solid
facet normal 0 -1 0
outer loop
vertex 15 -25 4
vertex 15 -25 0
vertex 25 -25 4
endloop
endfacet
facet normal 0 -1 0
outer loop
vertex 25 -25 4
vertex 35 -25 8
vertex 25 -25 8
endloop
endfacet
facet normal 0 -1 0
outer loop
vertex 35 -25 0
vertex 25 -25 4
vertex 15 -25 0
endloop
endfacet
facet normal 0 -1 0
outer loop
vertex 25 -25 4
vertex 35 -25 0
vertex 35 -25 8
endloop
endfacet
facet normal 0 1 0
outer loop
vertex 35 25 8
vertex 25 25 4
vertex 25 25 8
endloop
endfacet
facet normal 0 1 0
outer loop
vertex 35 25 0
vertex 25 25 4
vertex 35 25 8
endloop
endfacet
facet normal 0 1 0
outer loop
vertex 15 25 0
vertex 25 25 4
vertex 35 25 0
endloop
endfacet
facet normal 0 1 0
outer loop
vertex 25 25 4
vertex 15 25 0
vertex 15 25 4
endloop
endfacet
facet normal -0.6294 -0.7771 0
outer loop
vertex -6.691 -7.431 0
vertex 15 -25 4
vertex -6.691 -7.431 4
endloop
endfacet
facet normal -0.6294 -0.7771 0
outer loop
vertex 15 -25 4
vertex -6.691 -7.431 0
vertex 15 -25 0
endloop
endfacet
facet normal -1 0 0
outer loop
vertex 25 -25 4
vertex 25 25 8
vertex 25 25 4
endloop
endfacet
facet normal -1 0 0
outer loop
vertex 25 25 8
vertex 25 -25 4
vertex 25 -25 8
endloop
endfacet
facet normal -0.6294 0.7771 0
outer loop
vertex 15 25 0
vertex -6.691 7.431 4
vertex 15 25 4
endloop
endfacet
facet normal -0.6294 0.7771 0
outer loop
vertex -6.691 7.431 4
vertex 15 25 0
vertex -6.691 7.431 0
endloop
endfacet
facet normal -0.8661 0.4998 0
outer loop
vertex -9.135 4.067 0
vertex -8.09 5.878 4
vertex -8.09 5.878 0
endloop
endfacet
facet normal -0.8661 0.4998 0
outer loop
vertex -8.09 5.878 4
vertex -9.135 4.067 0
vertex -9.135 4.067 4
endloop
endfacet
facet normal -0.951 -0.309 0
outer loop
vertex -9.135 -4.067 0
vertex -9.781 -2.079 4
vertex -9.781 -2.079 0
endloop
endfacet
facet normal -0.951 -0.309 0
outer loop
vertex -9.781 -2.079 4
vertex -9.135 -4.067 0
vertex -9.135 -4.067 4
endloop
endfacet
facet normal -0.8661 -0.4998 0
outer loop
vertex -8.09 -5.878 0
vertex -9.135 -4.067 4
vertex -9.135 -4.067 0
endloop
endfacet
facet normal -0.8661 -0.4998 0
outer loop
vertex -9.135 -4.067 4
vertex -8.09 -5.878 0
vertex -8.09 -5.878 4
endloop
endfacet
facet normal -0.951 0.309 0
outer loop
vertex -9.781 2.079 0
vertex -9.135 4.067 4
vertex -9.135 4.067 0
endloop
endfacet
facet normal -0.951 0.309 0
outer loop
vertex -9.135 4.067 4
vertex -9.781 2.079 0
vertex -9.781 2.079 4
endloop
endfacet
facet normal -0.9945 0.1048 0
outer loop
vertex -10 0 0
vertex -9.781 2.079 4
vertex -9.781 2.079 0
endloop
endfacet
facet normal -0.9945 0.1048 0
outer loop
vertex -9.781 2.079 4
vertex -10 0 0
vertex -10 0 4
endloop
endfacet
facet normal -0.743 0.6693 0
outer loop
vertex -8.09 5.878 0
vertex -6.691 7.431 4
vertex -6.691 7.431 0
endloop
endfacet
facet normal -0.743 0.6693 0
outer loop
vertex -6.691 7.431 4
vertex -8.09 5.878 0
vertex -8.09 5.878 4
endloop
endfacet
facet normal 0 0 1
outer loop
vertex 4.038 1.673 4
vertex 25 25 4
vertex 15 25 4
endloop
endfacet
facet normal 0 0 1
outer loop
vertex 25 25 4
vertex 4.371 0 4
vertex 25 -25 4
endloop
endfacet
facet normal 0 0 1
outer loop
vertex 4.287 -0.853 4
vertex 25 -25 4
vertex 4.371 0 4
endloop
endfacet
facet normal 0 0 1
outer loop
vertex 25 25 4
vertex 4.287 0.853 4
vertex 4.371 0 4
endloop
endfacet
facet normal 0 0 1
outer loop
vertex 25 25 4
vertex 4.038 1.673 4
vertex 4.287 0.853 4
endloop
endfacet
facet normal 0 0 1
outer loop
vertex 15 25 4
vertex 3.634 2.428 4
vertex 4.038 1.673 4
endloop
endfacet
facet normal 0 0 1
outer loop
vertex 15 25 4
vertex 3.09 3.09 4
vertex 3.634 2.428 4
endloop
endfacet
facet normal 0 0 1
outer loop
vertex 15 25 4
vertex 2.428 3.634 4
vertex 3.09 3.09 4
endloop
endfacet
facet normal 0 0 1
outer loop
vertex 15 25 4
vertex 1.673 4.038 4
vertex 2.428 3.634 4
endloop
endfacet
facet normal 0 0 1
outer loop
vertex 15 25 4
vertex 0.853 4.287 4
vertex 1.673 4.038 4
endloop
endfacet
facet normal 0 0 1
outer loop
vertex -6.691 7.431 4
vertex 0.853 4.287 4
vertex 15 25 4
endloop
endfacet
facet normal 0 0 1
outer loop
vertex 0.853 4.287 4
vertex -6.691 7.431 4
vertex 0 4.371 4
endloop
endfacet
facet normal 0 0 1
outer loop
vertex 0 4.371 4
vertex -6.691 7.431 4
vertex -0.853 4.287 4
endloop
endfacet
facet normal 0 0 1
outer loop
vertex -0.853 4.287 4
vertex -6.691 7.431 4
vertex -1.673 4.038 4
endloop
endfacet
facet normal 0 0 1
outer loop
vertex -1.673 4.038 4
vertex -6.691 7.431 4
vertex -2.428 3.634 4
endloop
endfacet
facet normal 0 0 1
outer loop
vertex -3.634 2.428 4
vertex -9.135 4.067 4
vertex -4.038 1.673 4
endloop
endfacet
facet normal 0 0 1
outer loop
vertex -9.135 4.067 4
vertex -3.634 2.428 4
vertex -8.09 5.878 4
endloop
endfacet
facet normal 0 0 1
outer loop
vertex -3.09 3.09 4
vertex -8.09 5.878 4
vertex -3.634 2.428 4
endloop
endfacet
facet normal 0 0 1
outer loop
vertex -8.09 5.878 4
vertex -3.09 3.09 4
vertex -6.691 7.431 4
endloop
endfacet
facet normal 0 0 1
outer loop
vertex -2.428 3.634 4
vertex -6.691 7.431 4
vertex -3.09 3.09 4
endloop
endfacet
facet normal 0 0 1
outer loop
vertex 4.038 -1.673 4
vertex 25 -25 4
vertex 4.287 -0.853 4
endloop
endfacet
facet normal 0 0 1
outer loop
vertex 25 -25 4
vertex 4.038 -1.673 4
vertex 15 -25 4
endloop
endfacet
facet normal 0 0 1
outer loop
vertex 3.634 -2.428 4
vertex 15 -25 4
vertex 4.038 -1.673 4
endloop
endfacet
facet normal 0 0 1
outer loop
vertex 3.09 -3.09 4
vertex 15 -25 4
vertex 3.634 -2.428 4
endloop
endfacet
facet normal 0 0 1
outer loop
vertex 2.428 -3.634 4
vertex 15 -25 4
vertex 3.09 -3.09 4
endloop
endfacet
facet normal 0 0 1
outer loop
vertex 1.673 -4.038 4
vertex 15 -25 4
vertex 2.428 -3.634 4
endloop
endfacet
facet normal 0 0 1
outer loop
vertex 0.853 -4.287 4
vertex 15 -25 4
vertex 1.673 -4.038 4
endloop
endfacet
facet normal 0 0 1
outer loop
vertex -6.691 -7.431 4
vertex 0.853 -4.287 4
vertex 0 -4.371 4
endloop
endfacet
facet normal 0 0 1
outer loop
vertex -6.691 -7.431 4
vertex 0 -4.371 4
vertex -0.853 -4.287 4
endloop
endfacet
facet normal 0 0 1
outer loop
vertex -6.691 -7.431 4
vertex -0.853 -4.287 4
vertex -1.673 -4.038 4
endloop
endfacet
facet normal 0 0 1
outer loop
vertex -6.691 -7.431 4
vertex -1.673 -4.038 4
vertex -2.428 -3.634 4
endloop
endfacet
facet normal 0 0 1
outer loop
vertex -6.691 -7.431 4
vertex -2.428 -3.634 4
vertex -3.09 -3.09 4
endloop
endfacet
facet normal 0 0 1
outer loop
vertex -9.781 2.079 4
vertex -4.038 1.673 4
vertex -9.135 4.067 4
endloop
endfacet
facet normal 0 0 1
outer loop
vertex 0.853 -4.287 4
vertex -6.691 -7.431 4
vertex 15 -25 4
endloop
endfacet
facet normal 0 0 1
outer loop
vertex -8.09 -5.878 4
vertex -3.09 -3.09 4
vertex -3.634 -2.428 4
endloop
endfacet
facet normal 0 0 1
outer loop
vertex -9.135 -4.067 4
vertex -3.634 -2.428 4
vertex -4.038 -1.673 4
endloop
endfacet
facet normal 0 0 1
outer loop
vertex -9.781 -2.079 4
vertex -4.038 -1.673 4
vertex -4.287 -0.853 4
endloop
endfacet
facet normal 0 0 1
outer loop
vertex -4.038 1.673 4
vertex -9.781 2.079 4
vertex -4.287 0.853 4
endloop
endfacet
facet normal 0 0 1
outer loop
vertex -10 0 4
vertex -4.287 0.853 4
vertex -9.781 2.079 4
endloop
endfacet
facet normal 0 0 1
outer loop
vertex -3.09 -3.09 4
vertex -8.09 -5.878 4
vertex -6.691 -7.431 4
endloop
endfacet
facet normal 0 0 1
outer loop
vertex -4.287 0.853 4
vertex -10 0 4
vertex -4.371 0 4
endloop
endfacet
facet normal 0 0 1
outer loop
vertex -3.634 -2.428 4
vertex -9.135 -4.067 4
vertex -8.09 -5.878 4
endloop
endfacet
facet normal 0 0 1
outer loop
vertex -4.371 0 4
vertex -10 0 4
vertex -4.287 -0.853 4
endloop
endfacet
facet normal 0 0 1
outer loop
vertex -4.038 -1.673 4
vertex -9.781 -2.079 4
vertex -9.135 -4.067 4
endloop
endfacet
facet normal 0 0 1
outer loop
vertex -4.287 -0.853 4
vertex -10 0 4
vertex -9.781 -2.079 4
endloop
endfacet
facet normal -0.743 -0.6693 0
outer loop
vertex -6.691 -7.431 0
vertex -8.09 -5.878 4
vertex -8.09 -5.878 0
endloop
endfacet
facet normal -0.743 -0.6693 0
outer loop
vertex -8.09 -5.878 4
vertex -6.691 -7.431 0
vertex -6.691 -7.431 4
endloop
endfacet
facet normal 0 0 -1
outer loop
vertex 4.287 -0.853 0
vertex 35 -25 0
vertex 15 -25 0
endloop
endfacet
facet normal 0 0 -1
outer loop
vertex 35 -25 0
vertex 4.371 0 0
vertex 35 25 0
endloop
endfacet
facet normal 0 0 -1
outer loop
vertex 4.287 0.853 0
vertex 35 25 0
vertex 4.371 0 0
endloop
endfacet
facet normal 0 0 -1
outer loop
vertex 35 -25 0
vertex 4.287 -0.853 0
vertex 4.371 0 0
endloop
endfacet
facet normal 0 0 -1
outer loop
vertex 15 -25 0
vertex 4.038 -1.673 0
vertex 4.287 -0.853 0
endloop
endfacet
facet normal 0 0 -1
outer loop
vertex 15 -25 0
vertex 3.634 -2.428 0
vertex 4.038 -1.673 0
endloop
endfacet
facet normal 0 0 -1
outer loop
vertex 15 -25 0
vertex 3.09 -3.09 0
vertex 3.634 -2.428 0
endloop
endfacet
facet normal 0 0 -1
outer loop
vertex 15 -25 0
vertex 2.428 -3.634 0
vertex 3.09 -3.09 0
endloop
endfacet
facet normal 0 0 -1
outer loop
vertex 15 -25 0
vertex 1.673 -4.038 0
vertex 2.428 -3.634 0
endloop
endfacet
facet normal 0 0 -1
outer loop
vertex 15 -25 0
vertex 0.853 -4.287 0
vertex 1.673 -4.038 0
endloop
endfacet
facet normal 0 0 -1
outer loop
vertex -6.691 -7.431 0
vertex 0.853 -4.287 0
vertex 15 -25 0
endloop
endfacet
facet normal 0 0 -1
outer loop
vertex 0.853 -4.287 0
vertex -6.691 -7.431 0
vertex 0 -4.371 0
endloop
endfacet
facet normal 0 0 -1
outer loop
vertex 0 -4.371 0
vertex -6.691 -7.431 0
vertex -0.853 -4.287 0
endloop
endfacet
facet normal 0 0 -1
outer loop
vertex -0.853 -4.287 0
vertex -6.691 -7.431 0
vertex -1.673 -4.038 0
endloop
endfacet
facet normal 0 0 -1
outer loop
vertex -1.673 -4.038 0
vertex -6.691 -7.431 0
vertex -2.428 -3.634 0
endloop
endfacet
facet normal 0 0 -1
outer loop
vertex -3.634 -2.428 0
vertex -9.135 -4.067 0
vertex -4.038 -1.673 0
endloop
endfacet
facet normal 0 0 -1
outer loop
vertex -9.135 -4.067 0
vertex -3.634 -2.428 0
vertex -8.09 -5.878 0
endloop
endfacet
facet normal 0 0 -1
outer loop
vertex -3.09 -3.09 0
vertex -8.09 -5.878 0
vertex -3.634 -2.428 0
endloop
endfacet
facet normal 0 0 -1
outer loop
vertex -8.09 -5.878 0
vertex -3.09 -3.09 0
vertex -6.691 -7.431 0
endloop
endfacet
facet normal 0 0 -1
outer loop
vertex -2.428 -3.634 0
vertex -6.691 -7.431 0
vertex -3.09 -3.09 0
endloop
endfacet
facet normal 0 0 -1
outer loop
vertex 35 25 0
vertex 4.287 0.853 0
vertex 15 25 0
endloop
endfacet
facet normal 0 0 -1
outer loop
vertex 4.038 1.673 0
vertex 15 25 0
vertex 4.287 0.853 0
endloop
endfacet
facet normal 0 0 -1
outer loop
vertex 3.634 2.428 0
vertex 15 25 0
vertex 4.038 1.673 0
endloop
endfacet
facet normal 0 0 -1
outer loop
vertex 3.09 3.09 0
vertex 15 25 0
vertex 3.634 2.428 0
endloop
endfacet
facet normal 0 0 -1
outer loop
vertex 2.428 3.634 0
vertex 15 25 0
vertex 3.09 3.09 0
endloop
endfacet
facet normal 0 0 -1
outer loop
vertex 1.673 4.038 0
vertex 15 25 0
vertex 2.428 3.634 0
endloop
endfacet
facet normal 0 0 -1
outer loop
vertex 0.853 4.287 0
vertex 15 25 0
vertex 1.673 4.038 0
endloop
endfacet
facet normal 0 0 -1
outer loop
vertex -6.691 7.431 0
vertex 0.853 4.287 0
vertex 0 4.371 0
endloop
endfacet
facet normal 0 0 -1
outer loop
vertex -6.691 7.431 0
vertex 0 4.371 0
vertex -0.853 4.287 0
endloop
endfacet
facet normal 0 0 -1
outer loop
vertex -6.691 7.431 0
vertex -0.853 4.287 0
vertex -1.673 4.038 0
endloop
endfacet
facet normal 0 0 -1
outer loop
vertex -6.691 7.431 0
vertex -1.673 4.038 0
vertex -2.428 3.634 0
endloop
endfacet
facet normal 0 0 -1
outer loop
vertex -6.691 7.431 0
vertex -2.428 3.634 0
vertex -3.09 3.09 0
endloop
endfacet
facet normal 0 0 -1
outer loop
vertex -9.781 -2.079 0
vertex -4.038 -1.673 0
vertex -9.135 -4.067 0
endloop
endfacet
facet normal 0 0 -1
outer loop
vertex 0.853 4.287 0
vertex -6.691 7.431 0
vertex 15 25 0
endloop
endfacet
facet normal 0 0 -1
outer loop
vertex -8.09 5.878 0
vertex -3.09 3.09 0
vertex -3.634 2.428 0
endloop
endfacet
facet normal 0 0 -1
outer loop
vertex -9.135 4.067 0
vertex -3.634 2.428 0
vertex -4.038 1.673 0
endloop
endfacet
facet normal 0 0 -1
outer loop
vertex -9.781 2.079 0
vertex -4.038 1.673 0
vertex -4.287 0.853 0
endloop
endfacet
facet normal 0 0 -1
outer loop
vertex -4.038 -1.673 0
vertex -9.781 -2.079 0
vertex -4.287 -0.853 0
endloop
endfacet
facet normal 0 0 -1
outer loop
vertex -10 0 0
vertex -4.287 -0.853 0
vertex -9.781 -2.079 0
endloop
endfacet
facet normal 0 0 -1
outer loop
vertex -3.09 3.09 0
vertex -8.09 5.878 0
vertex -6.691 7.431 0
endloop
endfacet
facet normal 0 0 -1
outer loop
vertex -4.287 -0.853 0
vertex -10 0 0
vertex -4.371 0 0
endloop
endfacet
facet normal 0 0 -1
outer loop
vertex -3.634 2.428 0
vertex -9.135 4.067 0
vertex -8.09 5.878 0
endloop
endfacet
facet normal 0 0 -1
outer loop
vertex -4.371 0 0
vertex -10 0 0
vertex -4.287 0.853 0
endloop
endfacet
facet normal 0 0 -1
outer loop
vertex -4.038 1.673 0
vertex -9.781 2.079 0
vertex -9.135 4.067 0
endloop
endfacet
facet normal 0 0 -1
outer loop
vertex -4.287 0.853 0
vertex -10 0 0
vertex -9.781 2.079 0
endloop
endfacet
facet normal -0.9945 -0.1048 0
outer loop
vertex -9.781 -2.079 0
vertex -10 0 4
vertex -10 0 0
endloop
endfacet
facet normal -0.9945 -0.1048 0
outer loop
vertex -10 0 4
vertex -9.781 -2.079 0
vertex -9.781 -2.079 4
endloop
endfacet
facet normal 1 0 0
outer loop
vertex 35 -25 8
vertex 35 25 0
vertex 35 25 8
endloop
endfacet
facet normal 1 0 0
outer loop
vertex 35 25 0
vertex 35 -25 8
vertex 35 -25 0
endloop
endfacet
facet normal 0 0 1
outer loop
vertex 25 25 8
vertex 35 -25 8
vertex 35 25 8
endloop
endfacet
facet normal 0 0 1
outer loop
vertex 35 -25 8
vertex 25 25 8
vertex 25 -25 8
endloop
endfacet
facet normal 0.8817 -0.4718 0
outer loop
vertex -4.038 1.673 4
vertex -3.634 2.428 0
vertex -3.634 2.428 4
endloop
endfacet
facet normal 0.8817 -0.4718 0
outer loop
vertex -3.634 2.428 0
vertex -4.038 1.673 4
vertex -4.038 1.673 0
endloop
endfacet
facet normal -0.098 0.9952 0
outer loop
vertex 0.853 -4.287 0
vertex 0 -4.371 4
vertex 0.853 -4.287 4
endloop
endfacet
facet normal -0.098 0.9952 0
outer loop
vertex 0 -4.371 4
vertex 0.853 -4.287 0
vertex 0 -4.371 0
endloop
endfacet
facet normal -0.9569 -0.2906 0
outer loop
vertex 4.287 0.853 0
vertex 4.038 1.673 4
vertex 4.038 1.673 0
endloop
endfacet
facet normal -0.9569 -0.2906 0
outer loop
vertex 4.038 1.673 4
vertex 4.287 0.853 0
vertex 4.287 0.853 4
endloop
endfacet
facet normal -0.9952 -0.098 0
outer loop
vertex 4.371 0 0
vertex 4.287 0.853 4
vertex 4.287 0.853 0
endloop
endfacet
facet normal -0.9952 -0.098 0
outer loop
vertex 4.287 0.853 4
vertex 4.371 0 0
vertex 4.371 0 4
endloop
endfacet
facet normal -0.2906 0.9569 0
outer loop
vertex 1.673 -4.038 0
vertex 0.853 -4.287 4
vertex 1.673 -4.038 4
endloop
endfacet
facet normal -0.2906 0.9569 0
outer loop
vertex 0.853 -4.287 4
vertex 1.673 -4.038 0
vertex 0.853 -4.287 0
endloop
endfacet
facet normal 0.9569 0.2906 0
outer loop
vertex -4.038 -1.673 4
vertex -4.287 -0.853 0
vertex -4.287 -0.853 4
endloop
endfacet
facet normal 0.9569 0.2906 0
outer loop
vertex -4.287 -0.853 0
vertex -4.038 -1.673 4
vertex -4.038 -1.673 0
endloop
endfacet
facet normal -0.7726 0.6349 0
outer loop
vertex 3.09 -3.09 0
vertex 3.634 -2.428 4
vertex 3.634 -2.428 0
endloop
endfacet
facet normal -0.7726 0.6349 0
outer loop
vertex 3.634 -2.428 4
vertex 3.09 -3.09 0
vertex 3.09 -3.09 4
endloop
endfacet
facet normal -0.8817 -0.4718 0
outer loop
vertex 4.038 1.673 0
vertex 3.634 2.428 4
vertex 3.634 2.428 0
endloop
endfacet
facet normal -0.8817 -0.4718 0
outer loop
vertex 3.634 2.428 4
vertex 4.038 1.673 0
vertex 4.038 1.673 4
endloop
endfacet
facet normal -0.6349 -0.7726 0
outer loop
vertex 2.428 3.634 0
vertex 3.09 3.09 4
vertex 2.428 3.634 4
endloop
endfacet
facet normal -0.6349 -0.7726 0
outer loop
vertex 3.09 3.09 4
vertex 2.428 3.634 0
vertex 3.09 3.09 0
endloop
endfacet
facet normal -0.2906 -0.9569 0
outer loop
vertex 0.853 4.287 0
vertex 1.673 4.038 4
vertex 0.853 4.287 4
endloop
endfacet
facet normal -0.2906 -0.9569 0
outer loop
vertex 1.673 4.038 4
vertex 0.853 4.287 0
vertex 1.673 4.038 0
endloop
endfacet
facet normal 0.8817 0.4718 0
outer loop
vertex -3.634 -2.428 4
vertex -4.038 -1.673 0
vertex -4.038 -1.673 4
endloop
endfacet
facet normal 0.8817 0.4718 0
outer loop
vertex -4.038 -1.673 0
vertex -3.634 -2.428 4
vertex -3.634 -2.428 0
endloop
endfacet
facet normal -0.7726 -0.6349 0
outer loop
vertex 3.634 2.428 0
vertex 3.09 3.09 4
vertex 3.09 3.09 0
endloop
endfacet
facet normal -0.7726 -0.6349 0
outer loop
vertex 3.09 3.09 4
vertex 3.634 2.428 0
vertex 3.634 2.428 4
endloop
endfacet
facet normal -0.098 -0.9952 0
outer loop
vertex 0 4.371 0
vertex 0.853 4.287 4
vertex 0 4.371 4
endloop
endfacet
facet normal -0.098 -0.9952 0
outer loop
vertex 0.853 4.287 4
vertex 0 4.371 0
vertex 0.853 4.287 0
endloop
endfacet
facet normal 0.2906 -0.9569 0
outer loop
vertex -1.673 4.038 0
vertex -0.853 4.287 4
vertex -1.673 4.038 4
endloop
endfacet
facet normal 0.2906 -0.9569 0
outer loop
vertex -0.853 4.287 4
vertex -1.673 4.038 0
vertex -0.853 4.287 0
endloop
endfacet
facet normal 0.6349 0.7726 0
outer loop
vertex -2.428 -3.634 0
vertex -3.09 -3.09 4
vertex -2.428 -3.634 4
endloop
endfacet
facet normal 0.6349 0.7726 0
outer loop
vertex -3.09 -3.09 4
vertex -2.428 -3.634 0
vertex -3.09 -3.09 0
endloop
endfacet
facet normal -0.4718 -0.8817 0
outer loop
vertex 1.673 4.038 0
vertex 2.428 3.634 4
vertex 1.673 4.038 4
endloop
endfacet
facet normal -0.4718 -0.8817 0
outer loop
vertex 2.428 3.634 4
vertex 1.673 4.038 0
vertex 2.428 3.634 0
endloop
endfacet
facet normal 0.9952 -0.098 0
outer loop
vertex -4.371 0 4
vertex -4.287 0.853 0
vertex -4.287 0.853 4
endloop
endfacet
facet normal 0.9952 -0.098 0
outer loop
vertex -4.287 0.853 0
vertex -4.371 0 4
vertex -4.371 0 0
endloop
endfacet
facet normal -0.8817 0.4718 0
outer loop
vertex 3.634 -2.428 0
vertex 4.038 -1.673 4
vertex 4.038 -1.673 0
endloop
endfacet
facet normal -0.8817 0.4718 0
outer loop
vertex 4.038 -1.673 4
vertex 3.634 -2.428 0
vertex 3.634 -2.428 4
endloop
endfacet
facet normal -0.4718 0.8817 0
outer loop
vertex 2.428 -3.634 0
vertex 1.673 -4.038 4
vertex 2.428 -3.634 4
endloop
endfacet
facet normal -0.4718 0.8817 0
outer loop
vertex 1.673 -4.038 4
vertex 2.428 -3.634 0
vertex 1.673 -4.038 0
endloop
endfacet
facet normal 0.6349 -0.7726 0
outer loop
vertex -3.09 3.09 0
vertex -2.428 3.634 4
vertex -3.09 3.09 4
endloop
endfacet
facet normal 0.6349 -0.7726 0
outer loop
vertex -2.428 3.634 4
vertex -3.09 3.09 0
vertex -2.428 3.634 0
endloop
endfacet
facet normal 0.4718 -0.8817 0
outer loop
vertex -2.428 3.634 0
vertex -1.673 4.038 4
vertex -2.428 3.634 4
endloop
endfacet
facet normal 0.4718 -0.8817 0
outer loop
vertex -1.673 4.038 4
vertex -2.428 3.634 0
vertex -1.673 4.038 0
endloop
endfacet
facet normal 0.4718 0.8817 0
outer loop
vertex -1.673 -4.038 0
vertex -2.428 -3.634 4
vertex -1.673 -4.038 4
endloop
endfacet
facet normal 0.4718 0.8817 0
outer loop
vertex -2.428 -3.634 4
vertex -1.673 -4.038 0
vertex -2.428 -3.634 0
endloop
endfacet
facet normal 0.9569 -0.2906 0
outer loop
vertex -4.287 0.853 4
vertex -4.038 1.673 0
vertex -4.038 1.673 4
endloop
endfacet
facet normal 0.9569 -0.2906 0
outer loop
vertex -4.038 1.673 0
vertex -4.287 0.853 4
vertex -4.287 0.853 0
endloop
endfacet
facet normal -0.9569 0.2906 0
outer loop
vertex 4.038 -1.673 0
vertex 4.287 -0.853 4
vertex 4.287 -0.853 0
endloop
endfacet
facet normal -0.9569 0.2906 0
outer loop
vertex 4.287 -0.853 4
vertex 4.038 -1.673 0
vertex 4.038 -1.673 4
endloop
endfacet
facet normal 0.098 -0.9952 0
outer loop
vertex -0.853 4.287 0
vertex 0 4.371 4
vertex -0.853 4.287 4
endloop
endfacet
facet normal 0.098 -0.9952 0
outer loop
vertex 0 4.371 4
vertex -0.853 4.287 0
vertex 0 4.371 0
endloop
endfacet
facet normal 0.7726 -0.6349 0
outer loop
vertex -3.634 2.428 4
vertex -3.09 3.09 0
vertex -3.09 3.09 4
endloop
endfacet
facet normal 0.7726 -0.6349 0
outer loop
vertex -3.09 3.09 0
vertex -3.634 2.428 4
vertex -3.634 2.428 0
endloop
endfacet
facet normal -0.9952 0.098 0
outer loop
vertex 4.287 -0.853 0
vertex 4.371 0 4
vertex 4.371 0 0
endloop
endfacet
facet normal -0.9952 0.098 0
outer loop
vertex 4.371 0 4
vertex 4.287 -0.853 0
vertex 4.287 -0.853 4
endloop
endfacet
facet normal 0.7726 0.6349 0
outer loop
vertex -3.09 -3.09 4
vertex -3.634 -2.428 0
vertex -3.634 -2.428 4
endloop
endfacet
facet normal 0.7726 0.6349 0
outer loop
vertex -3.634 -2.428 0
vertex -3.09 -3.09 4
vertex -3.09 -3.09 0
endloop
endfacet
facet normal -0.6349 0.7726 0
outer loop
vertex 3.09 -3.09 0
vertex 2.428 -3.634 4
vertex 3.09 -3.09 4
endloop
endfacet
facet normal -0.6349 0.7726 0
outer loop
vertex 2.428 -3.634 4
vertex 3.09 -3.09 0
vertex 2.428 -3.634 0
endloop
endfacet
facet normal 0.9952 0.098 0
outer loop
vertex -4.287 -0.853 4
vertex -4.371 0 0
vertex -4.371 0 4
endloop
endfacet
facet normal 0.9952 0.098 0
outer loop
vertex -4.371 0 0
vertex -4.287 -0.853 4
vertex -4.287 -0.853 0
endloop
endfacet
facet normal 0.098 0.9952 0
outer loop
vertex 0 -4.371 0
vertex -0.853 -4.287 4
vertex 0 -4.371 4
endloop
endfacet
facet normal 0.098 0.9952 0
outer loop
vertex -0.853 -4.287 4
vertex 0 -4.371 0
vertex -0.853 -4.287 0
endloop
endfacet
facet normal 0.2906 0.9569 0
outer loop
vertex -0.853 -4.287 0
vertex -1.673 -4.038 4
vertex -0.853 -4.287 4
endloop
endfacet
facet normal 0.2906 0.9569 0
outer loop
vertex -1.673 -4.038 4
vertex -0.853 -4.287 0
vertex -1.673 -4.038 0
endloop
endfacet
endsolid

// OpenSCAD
// file: bolts.scad
$radial_error = 0.1;
$fn = 4*8;

module cylinder_outer(height, radius, fn=$fn, radial_error=$radial_error) {
	fudge = 1/cos(180/fn);
	cylinder(h=height,r=radius*fudge+$radial_error, $fn=fn);
}

module cylinder_inner(height, radius, fn=$fn) {
	cylinder(h=height,r=radius-$radial_error,$fn=fn);
}

// Make a hole. The diameter is the size of the screw (e.g. 3 for M3). Depth is how far the hole should go for the thread, and inset is how far out there should be a hole for the head to go.
module hole(diameter=3, depth=6, inset=10) {
	cylinder_outer(depth, diameter/2);
	translate([0, 0, depth]) cylinder_outer(inset, diameter, 32);
}

module countersunk_hole(diameter=3, depth=6, inset=10) {
	hole(diameter, depth, inset);
	translate([0, 0, depth-diameter/2]) cylinder(r1=diameter/2+$radial_error, r2=diameter+$radial_error, h=diameter/2);
}

module threaded_countersunk_hole(diameter=3, depth=6, inset=10) {
	hole(diameter*0.9, depth, inset);
	translate([0, 0, depth-diameter/2]) cylinder(r1=diameter/2+$radial_error, r2=diameter+$radial_error, h=diameter/2);
}

module knurled_insert(diameter = 3, depth = 6, thickness = 1) {
	cylinder_inner(depth, diameter/2 + thickness);
}

module knurled_hole(diameter = 3, depth = 6, inset = 10, insert = 4, thickness = 1) {
	hole(diameter, depth, inset);
	
	knurled_insert(diameter, insert, thickness);
}

module countersunk_knurled_hole(diameter = 3, depth = 6, inset = 10, insert = 4, thickness = 1) {
	countersunk_hole(diameter, depth, inset);
	
	knurled_insert(diameter, insert, thickness);
}

// Make a hole for a bolt/screw combination.
module bolted_hole(diameter=3, depth=8, nut_offset=2, shaft_length=10, inset=10) {
	hole(diameter, depth, inset);
	hull() {
		shaft_width = diameter;
		translate([0, 0, nut_offset]) rotate(360/12, [0, 0, 1]) cylinder_outer(diameter, shaft_width, 6);
		translate([0, shaft_length, nut_offset]) rotate(360/12, [0, 0, 1]) cylinder_outer(diameter, shaft_width, 6);
	}
}

module countersunk_bolted_hole(diameter=3, depth=8, nut_offset=2, shaft_length=10, inset=10) {
	countersunk_hole(diameter, depth, inset);
	hull() {
		shaft_width = diameter;
		translate([0, 0, nut_offset]) rotate(360/12, [0, 0, 1]) cylinder_outer(diameter, shaft_width, 6);
		translate([0, shaft_length, nut_offset]) rotate(360/12, [0, 0, 1]) cylinder_outer(diameter, shaft_width, 6);
	}
}

module mounting_hole(diameter=3, depth=6, inset=10, outset=3) {
	difference() {
		cylinder_outer(depth, diameter/2+outset);
		hole(diameter=diameter, depth=depth, inset=inset);
	}
}

render() rotate(90, [1, 0, 0]) difference() {
	cube([40, 10, 10]);
	translate([5, 5, 0]) bolted_hole(diameter=3, depth=8);
	translate([15, 5, 0]) bolted_hole(diameter=4, depth=8);
	translate([25, 5, 0]) countersunk_hole(diameter=4, depth=8);
	translate([35, 5, 0]) knurled_hole();
}
// file: zcube.scad
// This function creates a cube with a given x/y either above (f=1) or below (f=-1) the z axis.
module zcube(dimensions, z=0, f=1, x=0, y=0, bom=false) {
	if (bom) {
		echo(bom, dimensions);
	}
	
	translate([x*dimensions[0]/2, y*dimensions[1]/2, dimensions[2]/2 * f + z]) cube(dimensions, true);
}

module zring(dimensions, thickness, z=0, f=1) {
	render() difference() {
		zcube([dimensions[0]+thickness/2, dimensions[1]+thickness/2, dimensions[2]], z=z, f=f);
		zcube([dimensions[0]-thickness/2, dimensions[1]-thickness/2, dimensions[2]], z=z, f=f);
	}
}

module rcube(dimensions, d, z=0, f=1) {
	dx = dimensions[0]/2 - d/2;
	dy = dimensions[1]/2 - d/2;
	dz = dimensions[2]/2 * (f-1) + z;
	
	hull() {
		translate([-dx, -dy, dz]) cylinder(h=dimensions[2], d=d);
		translate([-dx, dy, dz]) cylinder(h=dimensions[2], d=d);
		translate([dx, -dy, dz]) cylinder(h=dimensions[2], d=d);
		translate([dx, dy, dz]) cylinder(h=dimensions[2], d=d);
	}
}

module zcorners() {
	children();
	mirror([1, 0, 0]) children();
	
	mirror([0, 1, 0]) {
		children();
		mirror([1, 0, 0]) children();
	}
}
// main file
use <zcube.scad>;
use <bolts.scad>;

difference() {
	union() {
		hull() {
			cylinder(d=20, h=4);
			translate([25, 0, 0]) zcube([10,50,4], x=-1);
		}

		translate([25, 0, 0]) zcube([10,50,8], x=1);
	}
	
	hole(8.5);
}
